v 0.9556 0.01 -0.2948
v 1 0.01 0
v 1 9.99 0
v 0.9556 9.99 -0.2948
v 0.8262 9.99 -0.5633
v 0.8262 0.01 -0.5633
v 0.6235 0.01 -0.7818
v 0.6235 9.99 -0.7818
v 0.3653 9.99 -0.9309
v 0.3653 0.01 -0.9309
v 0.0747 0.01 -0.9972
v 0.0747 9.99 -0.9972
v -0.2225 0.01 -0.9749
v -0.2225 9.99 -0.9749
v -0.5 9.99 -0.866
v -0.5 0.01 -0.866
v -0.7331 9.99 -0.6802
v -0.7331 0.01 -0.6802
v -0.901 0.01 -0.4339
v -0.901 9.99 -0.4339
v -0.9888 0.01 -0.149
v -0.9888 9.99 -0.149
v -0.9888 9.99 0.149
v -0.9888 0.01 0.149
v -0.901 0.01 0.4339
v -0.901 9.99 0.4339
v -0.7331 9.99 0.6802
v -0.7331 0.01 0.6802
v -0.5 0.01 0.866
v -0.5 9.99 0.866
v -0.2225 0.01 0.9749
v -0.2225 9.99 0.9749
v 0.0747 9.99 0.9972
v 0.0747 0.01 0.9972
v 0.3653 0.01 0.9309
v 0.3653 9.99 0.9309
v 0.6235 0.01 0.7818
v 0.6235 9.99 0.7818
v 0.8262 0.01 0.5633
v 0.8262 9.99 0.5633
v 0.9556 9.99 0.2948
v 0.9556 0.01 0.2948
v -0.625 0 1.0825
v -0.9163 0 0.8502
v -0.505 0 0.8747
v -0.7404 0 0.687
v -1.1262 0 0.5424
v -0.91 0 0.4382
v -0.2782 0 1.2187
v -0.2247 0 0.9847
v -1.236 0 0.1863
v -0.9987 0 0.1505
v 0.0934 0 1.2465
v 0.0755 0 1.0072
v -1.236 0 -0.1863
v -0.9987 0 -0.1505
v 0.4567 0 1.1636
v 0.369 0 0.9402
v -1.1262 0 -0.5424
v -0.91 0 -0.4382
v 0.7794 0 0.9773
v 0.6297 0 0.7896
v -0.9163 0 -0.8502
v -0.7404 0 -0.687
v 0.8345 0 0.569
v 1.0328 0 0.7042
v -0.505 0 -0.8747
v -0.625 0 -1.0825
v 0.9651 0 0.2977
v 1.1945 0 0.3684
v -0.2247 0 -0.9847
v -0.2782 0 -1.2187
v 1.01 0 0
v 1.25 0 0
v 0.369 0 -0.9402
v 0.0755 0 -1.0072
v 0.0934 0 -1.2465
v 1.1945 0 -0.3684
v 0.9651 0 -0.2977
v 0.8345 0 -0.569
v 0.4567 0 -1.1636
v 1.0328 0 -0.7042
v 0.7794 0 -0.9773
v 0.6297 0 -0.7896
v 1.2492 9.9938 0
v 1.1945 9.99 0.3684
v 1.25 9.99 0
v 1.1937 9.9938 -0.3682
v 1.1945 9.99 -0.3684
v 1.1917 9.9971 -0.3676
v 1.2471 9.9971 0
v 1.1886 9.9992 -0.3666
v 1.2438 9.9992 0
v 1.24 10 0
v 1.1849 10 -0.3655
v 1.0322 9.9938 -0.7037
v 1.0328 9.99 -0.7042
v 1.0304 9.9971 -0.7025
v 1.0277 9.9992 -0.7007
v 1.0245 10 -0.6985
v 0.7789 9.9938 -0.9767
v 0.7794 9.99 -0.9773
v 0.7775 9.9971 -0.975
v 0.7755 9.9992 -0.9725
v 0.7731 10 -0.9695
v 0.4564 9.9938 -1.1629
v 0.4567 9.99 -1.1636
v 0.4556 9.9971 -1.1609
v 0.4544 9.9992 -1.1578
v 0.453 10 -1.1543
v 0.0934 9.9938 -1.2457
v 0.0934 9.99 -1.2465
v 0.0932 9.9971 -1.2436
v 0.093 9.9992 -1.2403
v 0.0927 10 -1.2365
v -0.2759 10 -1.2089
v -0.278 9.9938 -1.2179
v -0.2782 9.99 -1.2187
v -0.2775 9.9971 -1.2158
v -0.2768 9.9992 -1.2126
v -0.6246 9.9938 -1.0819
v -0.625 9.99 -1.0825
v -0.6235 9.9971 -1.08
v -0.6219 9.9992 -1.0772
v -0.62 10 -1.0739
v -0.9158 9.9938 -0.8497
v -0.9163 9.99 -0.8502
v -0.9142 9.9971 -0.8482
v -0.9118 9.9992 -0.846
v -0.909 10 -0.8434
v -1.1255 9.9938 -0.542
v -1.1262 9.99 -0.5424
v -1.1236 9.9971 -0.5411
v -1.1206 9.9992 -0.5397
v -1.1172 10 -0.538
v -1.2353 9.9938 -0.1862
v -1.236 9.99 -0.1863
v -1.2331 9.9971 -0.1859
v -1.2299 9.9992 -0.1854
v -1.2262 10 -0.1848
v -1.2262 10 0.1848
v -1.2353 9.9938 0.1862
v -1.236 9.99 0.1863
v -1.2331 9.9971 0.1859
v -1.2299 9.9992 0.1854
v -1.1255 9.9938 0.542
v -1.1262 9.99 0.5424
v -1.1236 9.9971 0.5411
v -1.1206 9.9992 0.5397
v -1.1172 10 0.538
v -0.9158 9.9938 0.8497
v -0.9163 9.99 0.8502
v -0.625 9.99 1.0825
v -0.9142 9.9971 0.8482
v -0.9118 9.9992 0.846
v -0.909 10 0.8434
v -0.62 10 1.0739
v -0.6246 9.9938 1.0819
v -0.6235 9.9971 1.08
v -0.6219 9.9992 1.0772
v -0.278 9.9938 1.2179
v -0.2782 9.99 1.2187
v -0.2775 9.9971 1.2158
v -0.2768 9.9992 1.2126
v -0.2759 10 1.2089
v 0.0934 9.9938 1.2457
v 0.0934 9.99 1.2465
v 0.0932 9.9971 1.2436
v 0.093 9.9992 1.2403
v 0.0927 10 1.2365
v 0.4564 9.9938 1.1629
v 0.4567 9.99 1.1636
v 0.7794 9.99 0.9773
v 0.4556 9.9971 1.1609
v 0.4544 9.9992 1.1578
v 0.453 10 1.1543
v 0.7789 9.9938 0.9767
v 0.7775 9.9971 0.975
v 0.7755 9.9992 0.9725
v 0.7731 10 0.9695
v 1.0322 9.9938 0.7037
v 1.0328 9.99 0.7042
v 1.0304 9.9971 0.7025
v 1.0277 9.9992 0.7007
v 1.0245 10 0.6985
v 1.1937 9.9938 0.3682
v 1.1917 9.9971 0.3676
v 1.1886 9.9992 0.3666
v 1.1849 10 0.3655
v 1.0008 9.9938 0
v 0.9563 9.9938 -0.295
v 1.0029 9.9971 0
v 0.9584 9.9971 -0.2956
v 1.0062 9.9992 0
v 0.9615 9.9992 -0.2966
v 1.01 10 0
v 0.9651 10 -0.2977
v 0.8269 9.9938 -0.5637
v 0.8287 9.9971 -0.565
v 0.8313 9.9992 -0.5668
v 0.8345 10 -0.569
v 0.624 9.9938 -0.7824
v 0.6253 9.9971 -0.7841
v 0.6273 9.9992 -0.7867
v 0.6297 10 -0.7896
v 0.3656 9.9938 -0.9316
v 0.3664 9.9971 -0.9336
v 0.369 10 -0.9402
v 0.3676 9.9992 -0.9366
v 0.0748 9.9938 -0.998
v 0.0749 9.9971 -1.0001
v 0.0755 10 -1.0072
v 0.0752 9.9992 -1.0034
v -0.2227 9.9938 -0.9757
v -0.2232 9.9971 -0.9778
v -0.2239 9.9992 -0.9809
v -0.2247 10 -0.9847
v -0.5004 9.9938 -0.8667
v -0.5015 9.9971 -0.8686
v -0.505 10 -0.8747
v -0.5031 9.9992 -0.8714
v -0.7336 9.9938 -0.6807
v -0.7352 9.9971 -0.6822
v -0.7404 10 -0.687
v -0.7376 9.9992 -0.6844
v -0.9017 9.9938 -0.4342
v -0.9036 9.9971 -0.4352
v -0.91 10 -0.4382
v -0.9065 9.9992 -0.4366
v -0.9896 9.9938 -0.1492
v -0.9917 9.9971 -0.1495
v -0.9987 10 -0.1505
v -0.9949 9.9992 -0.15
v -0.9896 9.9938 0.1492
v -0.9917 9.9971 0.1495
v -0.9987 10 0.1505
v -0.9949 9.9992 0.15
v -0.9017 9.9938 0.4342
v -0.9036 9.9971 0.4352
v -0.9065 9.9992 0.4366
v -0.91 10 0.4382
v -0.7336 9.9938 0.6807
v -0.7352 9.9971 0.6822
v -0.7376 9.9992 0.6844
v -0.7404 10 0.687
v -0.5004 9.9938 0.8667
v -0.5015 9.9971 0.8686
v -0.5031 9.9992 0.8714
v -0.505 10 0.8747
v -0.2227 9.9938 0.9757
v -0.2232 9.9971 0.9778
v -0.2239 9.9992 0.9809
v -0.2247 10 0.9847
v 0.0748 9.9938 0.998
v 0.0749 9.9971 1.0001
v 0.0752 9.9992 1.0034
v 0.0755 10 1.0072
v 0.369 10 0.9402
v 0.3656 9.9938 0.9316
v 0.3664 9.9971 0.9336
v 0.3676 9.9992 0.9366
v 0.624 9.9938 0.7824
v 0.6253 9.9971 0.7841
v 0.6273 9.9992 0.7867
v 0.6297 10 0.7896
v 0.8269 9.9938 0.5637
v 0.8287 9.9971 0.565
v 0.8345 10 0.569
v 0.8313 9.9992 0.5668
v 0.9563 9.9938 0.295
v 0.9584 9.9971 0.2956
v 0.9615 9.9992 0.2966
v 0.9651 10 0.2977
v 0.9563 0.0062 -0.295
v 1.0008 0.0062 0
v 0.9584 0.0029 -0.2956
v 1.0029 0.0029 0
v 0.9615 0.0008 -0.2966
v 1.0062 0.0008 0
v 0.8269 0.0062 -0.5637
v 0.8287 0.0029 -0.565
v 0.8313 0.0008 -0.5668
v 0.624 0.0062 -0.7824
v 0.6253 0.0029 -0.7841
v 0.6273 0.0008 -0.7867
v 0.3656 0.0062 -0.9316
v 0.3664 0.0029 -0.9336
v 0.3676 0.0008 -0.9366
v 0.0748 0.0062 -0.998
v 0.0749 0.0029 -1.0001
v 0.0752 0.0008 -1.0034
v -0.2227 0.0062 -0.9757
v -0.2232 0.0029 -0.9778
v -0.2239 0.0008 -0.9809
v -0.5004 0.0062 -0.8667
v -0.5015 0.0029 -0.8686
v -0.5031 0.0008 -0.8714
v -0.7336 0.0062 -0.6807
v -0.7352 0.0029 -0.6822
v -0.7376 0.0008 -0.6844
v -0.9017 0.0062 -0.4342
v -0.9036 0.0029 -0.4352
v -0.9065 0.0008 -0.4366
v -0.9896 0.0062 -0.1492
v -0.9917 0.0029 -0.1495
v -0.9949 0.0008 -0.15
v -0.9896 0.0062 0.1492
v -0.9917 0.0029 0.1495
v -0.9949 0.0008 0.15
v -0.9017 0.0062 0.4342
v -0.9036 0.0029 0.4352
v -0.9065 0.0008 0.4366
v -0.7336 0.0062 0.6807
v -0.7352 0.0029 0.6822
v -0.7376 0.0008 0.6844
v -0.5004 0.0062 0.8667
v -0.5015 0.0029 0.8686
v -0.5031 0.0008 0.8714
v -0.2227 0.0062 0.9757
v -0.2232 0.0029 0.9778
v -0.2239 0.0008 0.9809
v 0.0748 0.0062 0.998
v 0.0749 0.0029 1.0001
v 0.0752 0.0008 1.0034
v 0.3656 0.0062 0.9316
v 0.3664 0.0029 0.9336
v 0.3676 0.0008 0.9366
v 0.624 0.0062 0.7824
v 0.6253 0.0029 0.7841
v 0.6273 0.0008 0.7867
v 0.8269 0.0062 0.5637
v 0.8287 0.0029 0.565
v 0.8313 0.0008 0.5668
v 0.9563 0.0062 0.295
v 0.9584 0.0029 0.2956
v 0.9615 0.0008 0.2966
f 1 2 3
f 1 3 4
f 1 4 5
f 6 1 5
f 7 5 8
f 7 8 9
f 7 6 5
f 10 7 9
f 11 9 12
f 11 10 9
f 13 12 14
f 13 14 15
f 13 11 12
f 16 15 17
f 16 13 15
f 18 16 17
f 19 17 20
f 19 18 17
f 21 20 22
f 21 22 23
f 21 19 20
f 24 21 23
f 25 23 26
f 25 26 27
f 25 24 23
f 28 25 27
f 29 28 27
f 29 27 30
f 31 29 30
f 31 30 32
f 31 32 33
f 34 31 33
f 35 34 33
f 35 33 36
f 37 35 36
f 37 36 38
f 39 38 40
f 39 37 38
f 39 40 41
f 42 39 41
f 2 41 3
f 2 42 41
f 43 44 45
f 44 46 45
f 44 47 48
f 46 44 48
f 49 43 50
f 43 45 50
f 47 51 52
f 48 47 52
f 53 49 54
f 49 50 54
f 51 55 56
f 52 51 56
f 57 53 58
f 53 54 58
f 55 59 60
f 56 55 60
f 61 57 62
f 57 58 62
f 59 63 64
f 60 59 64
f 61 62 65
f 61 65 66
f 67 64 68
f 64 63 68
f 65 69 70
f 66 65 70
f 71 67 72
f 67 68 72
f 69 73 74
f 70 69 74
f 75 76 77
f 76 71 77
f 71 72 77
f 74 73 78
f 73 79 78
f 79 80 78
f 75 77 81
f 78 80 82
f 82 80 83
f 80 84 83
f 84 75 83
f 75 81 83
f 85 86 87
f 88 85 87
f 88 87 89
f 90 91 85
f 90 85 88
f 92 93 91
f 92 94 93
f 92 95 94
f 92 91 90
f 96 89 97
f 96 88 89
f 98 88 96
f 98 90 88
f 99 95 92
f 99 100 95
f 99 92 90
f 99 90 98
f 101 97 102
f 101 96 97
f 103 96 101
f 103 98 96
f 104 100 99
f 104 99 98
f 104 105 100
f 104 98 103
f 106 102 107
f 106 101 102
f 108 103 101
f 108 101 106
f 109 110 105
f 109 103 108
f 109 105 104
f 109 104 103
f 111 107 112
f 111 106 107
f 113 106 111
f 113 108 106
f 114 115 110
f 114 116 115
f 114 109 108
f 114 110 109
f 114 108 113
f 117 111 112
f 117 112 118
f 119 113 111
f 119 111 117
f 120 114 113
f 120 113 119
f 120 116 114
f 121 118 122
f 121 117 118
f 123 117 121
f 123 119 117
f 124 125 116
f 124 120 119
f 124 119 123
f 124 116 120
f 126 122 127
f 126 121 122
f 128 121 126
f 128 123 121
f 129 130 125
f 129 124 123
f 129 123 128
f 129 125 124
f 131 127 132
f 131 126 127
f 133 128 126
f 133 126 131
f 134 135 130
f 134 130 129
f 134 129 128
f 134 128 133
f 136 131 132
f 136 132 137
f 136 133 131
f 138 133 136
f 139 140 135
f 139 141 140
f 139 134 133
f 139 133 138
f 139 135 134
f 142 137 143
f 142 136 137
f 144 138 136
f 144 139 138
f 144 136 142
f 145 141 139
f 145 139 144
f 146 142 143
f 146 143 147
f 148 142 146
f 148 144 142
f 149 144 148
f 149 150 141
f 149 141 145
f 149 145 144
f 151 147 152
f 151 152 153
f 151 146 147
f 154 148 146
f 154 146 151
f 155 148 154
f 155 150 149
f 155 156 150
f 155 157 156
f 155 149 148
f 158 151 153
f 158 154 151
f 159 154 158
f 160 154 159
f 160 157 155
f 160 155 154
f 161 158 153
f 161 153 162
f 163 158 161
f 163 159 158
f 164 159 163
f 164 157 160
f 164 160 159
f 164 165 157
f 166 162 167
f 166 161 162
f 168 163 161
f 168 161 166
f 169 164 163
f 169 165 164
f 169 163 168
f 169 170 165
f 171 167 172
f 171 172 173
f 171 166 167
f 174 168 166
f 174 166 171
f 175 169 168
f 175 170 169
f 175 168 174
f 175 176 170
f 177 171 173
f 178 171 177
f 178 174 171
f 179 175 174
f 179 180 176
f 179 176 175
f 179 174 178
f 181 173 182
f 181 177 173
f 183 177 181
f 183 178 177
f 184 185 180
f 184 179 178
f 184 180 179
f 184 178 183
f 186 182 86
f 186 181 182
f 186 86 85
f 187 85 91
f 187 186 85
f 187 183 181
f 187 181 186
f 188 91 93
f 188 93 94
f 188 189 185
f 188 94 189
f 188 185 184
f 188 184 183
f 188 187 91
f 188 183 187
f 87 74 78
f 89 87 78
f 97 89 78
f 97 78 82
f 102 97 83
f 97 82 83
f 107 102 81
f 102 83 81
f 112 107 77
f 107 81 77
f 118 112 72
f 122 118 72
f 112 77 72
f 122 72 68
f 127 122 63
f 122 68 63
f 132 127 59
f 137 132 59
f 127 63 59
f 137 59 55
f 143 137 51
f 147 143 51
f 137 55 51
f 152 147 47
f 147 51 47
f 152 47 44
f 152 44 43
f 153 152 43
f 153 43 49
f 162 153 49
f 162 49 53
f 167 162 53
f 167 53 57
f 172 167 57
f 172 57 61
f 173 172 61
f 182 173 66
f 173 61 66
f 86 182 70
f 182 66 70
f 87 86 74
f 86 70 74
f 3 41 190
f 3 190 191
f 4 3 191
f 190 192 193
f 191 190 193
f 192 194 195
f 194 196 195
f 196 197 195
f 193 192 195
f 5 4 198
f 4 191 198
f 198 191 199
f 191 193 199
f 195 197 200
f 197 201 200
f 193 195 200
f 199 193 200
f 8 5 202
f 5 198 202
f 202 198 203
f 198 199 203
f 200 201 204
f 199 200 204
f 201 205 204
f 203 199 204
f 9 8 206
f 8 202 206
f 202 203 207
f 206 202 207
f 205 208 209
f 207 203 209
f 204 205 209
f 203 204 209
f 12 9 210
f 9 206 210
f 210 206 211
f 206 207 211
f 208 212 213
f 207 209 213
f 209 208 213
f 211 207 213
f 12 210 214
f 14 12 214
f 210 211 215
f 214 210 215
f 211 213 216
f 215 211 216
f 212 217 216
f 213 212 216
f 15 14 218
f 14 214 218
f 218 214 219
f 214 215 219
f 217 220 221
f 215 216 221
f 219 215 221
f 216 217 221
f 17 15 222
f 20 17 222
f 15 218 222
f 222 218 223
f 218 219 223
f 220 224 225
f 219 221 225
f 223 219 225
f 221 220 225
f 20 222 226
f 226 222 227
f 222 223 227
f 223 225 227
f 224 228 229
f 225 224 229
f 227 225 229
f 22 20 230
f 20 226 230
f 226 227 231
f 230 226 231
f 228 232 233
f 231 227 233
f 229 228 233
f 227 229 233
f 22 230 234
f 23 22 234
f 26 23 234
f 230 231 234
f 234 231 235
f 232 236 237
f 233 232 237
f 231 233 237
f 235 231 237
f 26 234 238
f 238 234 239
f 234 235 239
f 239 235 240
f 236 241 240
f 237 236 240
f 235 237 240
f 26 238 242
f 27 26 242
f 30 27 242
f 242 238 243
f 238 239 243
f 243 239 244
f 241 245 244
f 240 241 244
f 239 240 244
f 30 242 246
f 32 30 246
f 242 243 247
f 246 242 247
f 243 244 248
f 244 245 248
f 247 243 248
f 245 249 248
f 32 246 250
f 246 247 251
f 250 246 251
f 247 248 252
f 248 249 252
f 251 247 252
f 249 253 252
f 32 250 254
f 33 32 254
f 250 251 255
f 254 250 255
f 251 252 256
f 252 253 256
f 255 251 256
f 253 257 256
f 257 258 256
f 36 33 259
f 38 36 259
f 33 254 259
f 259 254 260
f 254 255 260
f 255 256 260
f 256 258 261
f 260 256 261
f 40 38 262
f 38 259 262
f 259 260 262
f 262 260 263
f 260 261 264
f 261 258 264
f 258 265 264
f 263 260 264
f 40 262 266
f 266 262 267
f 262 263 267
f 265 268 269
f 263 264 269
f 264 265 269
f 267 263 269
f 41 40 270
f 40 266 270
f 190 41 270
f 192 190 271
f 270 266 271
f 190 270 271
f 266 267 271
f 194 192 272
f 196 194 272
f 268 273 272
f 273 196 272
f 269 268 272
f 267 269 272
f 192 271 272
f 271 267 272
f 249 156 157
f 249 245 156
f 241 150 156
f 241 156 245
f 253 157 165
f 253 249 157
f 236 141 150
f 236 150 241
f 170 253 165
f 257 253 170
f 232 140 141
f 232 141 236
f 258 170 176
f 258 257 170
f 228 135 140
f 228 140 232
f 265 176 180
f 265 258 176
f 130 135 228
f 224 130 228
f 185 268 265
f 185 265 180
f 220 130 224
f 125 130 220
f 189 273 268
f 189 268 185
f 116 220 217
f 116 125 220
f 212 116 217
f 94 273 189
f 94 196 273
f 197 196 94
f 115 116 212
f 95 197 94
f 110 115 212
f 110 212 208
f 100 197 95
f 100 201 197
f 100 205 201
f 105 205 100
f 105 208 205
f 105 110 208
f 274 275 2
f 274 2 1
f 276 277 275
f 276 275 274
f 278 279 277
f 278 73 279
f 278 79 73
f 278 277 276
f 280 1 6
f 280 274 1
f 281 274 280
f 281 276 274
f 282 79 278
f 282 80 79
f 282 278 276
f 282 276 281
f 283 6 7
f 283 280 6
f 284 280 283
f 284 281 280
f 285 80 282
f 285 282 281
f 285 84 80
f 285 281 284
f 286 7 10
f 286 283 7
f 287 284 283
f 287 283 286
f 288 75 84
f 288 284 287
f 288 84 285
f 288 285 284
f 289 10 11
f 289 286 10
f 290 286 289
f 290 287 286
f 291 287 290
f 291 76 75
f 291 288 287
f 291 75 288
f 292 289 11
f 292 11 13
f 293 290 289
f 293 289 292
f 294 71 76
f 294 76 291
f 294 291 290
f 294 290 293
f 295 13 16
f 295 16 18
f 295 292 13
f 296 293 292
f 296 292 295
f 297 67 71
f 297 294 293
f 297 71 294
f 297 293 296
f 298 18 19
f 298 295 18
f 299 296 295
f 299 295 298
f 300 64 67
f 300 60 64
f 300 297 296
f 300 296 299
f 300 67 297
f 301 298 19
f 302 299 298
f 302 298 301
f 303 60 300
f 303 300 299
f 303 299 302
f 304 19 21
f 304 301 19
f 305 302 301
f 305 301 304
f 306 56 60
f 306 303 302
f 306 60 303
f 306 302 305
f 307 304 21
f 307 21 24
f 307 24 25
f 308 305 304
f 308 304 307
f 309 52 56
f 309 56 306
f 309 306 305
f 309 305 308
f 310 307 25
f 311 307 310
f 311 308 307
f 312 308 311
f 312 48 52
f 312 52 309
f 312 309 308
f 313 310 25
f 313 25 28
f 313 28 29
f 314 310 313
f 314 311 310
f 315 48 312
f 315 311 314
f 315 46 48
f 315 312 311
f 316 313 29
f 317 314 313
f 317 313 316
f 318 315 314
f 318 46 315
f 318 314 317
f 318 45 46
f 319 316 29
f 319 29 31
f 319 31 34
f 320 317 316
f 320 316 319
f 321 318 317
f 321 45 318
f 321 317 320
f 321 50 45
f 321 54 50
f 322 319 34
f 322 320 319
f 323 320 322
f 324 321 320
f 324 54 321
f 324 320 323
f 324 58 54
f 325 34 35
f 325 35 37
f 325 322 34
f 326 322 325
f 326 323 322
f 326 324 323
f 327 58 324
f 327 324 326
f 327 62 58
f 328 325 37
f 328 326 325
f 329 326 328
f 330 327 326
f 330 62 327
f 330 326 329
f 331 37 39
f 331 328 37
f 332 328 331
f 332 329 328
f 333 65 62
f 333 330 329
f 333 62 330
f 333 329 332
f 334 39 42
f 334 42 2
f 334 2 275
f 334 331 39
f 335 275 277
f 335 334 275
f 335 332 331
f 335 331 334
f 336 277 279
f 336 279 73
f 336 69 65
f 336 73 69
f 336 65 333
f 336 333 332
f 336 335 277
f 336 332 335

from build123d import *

# Parameters (mm, degrees)
SKETCH1_R           = 1.25
SKETCH1_R_2         = 1
BOSS_EXTRUDE1_DEPTH = 10
FILLET1_R           = 0.01


with BuildPart() as part:
    # Sketch1 → Boss-Extrude1 (new body)
    with BuildSketch(Plane(origin=(0, 0, 0), x_dir=(1, 0, 0), z_dir=(0, 1, 0))):
        Circle(SKETCH1_R)
        Circle(SKETCH1_R_2, mode=Mode.SUBTRACT)
    extrude(amount=BOSS_EXTRUDE1_DEPTH)

    # Fillet1
    fillet1_edges = [part.edges().sort_by_distance(p)[0] for p in [
        (-1.25, 10, 0),
        (-1, 0, 0),
        (-1, 10, 0),
    ]]
    fillet(fillet1_edges, radius=FILLET1_R)


solid = part.part
